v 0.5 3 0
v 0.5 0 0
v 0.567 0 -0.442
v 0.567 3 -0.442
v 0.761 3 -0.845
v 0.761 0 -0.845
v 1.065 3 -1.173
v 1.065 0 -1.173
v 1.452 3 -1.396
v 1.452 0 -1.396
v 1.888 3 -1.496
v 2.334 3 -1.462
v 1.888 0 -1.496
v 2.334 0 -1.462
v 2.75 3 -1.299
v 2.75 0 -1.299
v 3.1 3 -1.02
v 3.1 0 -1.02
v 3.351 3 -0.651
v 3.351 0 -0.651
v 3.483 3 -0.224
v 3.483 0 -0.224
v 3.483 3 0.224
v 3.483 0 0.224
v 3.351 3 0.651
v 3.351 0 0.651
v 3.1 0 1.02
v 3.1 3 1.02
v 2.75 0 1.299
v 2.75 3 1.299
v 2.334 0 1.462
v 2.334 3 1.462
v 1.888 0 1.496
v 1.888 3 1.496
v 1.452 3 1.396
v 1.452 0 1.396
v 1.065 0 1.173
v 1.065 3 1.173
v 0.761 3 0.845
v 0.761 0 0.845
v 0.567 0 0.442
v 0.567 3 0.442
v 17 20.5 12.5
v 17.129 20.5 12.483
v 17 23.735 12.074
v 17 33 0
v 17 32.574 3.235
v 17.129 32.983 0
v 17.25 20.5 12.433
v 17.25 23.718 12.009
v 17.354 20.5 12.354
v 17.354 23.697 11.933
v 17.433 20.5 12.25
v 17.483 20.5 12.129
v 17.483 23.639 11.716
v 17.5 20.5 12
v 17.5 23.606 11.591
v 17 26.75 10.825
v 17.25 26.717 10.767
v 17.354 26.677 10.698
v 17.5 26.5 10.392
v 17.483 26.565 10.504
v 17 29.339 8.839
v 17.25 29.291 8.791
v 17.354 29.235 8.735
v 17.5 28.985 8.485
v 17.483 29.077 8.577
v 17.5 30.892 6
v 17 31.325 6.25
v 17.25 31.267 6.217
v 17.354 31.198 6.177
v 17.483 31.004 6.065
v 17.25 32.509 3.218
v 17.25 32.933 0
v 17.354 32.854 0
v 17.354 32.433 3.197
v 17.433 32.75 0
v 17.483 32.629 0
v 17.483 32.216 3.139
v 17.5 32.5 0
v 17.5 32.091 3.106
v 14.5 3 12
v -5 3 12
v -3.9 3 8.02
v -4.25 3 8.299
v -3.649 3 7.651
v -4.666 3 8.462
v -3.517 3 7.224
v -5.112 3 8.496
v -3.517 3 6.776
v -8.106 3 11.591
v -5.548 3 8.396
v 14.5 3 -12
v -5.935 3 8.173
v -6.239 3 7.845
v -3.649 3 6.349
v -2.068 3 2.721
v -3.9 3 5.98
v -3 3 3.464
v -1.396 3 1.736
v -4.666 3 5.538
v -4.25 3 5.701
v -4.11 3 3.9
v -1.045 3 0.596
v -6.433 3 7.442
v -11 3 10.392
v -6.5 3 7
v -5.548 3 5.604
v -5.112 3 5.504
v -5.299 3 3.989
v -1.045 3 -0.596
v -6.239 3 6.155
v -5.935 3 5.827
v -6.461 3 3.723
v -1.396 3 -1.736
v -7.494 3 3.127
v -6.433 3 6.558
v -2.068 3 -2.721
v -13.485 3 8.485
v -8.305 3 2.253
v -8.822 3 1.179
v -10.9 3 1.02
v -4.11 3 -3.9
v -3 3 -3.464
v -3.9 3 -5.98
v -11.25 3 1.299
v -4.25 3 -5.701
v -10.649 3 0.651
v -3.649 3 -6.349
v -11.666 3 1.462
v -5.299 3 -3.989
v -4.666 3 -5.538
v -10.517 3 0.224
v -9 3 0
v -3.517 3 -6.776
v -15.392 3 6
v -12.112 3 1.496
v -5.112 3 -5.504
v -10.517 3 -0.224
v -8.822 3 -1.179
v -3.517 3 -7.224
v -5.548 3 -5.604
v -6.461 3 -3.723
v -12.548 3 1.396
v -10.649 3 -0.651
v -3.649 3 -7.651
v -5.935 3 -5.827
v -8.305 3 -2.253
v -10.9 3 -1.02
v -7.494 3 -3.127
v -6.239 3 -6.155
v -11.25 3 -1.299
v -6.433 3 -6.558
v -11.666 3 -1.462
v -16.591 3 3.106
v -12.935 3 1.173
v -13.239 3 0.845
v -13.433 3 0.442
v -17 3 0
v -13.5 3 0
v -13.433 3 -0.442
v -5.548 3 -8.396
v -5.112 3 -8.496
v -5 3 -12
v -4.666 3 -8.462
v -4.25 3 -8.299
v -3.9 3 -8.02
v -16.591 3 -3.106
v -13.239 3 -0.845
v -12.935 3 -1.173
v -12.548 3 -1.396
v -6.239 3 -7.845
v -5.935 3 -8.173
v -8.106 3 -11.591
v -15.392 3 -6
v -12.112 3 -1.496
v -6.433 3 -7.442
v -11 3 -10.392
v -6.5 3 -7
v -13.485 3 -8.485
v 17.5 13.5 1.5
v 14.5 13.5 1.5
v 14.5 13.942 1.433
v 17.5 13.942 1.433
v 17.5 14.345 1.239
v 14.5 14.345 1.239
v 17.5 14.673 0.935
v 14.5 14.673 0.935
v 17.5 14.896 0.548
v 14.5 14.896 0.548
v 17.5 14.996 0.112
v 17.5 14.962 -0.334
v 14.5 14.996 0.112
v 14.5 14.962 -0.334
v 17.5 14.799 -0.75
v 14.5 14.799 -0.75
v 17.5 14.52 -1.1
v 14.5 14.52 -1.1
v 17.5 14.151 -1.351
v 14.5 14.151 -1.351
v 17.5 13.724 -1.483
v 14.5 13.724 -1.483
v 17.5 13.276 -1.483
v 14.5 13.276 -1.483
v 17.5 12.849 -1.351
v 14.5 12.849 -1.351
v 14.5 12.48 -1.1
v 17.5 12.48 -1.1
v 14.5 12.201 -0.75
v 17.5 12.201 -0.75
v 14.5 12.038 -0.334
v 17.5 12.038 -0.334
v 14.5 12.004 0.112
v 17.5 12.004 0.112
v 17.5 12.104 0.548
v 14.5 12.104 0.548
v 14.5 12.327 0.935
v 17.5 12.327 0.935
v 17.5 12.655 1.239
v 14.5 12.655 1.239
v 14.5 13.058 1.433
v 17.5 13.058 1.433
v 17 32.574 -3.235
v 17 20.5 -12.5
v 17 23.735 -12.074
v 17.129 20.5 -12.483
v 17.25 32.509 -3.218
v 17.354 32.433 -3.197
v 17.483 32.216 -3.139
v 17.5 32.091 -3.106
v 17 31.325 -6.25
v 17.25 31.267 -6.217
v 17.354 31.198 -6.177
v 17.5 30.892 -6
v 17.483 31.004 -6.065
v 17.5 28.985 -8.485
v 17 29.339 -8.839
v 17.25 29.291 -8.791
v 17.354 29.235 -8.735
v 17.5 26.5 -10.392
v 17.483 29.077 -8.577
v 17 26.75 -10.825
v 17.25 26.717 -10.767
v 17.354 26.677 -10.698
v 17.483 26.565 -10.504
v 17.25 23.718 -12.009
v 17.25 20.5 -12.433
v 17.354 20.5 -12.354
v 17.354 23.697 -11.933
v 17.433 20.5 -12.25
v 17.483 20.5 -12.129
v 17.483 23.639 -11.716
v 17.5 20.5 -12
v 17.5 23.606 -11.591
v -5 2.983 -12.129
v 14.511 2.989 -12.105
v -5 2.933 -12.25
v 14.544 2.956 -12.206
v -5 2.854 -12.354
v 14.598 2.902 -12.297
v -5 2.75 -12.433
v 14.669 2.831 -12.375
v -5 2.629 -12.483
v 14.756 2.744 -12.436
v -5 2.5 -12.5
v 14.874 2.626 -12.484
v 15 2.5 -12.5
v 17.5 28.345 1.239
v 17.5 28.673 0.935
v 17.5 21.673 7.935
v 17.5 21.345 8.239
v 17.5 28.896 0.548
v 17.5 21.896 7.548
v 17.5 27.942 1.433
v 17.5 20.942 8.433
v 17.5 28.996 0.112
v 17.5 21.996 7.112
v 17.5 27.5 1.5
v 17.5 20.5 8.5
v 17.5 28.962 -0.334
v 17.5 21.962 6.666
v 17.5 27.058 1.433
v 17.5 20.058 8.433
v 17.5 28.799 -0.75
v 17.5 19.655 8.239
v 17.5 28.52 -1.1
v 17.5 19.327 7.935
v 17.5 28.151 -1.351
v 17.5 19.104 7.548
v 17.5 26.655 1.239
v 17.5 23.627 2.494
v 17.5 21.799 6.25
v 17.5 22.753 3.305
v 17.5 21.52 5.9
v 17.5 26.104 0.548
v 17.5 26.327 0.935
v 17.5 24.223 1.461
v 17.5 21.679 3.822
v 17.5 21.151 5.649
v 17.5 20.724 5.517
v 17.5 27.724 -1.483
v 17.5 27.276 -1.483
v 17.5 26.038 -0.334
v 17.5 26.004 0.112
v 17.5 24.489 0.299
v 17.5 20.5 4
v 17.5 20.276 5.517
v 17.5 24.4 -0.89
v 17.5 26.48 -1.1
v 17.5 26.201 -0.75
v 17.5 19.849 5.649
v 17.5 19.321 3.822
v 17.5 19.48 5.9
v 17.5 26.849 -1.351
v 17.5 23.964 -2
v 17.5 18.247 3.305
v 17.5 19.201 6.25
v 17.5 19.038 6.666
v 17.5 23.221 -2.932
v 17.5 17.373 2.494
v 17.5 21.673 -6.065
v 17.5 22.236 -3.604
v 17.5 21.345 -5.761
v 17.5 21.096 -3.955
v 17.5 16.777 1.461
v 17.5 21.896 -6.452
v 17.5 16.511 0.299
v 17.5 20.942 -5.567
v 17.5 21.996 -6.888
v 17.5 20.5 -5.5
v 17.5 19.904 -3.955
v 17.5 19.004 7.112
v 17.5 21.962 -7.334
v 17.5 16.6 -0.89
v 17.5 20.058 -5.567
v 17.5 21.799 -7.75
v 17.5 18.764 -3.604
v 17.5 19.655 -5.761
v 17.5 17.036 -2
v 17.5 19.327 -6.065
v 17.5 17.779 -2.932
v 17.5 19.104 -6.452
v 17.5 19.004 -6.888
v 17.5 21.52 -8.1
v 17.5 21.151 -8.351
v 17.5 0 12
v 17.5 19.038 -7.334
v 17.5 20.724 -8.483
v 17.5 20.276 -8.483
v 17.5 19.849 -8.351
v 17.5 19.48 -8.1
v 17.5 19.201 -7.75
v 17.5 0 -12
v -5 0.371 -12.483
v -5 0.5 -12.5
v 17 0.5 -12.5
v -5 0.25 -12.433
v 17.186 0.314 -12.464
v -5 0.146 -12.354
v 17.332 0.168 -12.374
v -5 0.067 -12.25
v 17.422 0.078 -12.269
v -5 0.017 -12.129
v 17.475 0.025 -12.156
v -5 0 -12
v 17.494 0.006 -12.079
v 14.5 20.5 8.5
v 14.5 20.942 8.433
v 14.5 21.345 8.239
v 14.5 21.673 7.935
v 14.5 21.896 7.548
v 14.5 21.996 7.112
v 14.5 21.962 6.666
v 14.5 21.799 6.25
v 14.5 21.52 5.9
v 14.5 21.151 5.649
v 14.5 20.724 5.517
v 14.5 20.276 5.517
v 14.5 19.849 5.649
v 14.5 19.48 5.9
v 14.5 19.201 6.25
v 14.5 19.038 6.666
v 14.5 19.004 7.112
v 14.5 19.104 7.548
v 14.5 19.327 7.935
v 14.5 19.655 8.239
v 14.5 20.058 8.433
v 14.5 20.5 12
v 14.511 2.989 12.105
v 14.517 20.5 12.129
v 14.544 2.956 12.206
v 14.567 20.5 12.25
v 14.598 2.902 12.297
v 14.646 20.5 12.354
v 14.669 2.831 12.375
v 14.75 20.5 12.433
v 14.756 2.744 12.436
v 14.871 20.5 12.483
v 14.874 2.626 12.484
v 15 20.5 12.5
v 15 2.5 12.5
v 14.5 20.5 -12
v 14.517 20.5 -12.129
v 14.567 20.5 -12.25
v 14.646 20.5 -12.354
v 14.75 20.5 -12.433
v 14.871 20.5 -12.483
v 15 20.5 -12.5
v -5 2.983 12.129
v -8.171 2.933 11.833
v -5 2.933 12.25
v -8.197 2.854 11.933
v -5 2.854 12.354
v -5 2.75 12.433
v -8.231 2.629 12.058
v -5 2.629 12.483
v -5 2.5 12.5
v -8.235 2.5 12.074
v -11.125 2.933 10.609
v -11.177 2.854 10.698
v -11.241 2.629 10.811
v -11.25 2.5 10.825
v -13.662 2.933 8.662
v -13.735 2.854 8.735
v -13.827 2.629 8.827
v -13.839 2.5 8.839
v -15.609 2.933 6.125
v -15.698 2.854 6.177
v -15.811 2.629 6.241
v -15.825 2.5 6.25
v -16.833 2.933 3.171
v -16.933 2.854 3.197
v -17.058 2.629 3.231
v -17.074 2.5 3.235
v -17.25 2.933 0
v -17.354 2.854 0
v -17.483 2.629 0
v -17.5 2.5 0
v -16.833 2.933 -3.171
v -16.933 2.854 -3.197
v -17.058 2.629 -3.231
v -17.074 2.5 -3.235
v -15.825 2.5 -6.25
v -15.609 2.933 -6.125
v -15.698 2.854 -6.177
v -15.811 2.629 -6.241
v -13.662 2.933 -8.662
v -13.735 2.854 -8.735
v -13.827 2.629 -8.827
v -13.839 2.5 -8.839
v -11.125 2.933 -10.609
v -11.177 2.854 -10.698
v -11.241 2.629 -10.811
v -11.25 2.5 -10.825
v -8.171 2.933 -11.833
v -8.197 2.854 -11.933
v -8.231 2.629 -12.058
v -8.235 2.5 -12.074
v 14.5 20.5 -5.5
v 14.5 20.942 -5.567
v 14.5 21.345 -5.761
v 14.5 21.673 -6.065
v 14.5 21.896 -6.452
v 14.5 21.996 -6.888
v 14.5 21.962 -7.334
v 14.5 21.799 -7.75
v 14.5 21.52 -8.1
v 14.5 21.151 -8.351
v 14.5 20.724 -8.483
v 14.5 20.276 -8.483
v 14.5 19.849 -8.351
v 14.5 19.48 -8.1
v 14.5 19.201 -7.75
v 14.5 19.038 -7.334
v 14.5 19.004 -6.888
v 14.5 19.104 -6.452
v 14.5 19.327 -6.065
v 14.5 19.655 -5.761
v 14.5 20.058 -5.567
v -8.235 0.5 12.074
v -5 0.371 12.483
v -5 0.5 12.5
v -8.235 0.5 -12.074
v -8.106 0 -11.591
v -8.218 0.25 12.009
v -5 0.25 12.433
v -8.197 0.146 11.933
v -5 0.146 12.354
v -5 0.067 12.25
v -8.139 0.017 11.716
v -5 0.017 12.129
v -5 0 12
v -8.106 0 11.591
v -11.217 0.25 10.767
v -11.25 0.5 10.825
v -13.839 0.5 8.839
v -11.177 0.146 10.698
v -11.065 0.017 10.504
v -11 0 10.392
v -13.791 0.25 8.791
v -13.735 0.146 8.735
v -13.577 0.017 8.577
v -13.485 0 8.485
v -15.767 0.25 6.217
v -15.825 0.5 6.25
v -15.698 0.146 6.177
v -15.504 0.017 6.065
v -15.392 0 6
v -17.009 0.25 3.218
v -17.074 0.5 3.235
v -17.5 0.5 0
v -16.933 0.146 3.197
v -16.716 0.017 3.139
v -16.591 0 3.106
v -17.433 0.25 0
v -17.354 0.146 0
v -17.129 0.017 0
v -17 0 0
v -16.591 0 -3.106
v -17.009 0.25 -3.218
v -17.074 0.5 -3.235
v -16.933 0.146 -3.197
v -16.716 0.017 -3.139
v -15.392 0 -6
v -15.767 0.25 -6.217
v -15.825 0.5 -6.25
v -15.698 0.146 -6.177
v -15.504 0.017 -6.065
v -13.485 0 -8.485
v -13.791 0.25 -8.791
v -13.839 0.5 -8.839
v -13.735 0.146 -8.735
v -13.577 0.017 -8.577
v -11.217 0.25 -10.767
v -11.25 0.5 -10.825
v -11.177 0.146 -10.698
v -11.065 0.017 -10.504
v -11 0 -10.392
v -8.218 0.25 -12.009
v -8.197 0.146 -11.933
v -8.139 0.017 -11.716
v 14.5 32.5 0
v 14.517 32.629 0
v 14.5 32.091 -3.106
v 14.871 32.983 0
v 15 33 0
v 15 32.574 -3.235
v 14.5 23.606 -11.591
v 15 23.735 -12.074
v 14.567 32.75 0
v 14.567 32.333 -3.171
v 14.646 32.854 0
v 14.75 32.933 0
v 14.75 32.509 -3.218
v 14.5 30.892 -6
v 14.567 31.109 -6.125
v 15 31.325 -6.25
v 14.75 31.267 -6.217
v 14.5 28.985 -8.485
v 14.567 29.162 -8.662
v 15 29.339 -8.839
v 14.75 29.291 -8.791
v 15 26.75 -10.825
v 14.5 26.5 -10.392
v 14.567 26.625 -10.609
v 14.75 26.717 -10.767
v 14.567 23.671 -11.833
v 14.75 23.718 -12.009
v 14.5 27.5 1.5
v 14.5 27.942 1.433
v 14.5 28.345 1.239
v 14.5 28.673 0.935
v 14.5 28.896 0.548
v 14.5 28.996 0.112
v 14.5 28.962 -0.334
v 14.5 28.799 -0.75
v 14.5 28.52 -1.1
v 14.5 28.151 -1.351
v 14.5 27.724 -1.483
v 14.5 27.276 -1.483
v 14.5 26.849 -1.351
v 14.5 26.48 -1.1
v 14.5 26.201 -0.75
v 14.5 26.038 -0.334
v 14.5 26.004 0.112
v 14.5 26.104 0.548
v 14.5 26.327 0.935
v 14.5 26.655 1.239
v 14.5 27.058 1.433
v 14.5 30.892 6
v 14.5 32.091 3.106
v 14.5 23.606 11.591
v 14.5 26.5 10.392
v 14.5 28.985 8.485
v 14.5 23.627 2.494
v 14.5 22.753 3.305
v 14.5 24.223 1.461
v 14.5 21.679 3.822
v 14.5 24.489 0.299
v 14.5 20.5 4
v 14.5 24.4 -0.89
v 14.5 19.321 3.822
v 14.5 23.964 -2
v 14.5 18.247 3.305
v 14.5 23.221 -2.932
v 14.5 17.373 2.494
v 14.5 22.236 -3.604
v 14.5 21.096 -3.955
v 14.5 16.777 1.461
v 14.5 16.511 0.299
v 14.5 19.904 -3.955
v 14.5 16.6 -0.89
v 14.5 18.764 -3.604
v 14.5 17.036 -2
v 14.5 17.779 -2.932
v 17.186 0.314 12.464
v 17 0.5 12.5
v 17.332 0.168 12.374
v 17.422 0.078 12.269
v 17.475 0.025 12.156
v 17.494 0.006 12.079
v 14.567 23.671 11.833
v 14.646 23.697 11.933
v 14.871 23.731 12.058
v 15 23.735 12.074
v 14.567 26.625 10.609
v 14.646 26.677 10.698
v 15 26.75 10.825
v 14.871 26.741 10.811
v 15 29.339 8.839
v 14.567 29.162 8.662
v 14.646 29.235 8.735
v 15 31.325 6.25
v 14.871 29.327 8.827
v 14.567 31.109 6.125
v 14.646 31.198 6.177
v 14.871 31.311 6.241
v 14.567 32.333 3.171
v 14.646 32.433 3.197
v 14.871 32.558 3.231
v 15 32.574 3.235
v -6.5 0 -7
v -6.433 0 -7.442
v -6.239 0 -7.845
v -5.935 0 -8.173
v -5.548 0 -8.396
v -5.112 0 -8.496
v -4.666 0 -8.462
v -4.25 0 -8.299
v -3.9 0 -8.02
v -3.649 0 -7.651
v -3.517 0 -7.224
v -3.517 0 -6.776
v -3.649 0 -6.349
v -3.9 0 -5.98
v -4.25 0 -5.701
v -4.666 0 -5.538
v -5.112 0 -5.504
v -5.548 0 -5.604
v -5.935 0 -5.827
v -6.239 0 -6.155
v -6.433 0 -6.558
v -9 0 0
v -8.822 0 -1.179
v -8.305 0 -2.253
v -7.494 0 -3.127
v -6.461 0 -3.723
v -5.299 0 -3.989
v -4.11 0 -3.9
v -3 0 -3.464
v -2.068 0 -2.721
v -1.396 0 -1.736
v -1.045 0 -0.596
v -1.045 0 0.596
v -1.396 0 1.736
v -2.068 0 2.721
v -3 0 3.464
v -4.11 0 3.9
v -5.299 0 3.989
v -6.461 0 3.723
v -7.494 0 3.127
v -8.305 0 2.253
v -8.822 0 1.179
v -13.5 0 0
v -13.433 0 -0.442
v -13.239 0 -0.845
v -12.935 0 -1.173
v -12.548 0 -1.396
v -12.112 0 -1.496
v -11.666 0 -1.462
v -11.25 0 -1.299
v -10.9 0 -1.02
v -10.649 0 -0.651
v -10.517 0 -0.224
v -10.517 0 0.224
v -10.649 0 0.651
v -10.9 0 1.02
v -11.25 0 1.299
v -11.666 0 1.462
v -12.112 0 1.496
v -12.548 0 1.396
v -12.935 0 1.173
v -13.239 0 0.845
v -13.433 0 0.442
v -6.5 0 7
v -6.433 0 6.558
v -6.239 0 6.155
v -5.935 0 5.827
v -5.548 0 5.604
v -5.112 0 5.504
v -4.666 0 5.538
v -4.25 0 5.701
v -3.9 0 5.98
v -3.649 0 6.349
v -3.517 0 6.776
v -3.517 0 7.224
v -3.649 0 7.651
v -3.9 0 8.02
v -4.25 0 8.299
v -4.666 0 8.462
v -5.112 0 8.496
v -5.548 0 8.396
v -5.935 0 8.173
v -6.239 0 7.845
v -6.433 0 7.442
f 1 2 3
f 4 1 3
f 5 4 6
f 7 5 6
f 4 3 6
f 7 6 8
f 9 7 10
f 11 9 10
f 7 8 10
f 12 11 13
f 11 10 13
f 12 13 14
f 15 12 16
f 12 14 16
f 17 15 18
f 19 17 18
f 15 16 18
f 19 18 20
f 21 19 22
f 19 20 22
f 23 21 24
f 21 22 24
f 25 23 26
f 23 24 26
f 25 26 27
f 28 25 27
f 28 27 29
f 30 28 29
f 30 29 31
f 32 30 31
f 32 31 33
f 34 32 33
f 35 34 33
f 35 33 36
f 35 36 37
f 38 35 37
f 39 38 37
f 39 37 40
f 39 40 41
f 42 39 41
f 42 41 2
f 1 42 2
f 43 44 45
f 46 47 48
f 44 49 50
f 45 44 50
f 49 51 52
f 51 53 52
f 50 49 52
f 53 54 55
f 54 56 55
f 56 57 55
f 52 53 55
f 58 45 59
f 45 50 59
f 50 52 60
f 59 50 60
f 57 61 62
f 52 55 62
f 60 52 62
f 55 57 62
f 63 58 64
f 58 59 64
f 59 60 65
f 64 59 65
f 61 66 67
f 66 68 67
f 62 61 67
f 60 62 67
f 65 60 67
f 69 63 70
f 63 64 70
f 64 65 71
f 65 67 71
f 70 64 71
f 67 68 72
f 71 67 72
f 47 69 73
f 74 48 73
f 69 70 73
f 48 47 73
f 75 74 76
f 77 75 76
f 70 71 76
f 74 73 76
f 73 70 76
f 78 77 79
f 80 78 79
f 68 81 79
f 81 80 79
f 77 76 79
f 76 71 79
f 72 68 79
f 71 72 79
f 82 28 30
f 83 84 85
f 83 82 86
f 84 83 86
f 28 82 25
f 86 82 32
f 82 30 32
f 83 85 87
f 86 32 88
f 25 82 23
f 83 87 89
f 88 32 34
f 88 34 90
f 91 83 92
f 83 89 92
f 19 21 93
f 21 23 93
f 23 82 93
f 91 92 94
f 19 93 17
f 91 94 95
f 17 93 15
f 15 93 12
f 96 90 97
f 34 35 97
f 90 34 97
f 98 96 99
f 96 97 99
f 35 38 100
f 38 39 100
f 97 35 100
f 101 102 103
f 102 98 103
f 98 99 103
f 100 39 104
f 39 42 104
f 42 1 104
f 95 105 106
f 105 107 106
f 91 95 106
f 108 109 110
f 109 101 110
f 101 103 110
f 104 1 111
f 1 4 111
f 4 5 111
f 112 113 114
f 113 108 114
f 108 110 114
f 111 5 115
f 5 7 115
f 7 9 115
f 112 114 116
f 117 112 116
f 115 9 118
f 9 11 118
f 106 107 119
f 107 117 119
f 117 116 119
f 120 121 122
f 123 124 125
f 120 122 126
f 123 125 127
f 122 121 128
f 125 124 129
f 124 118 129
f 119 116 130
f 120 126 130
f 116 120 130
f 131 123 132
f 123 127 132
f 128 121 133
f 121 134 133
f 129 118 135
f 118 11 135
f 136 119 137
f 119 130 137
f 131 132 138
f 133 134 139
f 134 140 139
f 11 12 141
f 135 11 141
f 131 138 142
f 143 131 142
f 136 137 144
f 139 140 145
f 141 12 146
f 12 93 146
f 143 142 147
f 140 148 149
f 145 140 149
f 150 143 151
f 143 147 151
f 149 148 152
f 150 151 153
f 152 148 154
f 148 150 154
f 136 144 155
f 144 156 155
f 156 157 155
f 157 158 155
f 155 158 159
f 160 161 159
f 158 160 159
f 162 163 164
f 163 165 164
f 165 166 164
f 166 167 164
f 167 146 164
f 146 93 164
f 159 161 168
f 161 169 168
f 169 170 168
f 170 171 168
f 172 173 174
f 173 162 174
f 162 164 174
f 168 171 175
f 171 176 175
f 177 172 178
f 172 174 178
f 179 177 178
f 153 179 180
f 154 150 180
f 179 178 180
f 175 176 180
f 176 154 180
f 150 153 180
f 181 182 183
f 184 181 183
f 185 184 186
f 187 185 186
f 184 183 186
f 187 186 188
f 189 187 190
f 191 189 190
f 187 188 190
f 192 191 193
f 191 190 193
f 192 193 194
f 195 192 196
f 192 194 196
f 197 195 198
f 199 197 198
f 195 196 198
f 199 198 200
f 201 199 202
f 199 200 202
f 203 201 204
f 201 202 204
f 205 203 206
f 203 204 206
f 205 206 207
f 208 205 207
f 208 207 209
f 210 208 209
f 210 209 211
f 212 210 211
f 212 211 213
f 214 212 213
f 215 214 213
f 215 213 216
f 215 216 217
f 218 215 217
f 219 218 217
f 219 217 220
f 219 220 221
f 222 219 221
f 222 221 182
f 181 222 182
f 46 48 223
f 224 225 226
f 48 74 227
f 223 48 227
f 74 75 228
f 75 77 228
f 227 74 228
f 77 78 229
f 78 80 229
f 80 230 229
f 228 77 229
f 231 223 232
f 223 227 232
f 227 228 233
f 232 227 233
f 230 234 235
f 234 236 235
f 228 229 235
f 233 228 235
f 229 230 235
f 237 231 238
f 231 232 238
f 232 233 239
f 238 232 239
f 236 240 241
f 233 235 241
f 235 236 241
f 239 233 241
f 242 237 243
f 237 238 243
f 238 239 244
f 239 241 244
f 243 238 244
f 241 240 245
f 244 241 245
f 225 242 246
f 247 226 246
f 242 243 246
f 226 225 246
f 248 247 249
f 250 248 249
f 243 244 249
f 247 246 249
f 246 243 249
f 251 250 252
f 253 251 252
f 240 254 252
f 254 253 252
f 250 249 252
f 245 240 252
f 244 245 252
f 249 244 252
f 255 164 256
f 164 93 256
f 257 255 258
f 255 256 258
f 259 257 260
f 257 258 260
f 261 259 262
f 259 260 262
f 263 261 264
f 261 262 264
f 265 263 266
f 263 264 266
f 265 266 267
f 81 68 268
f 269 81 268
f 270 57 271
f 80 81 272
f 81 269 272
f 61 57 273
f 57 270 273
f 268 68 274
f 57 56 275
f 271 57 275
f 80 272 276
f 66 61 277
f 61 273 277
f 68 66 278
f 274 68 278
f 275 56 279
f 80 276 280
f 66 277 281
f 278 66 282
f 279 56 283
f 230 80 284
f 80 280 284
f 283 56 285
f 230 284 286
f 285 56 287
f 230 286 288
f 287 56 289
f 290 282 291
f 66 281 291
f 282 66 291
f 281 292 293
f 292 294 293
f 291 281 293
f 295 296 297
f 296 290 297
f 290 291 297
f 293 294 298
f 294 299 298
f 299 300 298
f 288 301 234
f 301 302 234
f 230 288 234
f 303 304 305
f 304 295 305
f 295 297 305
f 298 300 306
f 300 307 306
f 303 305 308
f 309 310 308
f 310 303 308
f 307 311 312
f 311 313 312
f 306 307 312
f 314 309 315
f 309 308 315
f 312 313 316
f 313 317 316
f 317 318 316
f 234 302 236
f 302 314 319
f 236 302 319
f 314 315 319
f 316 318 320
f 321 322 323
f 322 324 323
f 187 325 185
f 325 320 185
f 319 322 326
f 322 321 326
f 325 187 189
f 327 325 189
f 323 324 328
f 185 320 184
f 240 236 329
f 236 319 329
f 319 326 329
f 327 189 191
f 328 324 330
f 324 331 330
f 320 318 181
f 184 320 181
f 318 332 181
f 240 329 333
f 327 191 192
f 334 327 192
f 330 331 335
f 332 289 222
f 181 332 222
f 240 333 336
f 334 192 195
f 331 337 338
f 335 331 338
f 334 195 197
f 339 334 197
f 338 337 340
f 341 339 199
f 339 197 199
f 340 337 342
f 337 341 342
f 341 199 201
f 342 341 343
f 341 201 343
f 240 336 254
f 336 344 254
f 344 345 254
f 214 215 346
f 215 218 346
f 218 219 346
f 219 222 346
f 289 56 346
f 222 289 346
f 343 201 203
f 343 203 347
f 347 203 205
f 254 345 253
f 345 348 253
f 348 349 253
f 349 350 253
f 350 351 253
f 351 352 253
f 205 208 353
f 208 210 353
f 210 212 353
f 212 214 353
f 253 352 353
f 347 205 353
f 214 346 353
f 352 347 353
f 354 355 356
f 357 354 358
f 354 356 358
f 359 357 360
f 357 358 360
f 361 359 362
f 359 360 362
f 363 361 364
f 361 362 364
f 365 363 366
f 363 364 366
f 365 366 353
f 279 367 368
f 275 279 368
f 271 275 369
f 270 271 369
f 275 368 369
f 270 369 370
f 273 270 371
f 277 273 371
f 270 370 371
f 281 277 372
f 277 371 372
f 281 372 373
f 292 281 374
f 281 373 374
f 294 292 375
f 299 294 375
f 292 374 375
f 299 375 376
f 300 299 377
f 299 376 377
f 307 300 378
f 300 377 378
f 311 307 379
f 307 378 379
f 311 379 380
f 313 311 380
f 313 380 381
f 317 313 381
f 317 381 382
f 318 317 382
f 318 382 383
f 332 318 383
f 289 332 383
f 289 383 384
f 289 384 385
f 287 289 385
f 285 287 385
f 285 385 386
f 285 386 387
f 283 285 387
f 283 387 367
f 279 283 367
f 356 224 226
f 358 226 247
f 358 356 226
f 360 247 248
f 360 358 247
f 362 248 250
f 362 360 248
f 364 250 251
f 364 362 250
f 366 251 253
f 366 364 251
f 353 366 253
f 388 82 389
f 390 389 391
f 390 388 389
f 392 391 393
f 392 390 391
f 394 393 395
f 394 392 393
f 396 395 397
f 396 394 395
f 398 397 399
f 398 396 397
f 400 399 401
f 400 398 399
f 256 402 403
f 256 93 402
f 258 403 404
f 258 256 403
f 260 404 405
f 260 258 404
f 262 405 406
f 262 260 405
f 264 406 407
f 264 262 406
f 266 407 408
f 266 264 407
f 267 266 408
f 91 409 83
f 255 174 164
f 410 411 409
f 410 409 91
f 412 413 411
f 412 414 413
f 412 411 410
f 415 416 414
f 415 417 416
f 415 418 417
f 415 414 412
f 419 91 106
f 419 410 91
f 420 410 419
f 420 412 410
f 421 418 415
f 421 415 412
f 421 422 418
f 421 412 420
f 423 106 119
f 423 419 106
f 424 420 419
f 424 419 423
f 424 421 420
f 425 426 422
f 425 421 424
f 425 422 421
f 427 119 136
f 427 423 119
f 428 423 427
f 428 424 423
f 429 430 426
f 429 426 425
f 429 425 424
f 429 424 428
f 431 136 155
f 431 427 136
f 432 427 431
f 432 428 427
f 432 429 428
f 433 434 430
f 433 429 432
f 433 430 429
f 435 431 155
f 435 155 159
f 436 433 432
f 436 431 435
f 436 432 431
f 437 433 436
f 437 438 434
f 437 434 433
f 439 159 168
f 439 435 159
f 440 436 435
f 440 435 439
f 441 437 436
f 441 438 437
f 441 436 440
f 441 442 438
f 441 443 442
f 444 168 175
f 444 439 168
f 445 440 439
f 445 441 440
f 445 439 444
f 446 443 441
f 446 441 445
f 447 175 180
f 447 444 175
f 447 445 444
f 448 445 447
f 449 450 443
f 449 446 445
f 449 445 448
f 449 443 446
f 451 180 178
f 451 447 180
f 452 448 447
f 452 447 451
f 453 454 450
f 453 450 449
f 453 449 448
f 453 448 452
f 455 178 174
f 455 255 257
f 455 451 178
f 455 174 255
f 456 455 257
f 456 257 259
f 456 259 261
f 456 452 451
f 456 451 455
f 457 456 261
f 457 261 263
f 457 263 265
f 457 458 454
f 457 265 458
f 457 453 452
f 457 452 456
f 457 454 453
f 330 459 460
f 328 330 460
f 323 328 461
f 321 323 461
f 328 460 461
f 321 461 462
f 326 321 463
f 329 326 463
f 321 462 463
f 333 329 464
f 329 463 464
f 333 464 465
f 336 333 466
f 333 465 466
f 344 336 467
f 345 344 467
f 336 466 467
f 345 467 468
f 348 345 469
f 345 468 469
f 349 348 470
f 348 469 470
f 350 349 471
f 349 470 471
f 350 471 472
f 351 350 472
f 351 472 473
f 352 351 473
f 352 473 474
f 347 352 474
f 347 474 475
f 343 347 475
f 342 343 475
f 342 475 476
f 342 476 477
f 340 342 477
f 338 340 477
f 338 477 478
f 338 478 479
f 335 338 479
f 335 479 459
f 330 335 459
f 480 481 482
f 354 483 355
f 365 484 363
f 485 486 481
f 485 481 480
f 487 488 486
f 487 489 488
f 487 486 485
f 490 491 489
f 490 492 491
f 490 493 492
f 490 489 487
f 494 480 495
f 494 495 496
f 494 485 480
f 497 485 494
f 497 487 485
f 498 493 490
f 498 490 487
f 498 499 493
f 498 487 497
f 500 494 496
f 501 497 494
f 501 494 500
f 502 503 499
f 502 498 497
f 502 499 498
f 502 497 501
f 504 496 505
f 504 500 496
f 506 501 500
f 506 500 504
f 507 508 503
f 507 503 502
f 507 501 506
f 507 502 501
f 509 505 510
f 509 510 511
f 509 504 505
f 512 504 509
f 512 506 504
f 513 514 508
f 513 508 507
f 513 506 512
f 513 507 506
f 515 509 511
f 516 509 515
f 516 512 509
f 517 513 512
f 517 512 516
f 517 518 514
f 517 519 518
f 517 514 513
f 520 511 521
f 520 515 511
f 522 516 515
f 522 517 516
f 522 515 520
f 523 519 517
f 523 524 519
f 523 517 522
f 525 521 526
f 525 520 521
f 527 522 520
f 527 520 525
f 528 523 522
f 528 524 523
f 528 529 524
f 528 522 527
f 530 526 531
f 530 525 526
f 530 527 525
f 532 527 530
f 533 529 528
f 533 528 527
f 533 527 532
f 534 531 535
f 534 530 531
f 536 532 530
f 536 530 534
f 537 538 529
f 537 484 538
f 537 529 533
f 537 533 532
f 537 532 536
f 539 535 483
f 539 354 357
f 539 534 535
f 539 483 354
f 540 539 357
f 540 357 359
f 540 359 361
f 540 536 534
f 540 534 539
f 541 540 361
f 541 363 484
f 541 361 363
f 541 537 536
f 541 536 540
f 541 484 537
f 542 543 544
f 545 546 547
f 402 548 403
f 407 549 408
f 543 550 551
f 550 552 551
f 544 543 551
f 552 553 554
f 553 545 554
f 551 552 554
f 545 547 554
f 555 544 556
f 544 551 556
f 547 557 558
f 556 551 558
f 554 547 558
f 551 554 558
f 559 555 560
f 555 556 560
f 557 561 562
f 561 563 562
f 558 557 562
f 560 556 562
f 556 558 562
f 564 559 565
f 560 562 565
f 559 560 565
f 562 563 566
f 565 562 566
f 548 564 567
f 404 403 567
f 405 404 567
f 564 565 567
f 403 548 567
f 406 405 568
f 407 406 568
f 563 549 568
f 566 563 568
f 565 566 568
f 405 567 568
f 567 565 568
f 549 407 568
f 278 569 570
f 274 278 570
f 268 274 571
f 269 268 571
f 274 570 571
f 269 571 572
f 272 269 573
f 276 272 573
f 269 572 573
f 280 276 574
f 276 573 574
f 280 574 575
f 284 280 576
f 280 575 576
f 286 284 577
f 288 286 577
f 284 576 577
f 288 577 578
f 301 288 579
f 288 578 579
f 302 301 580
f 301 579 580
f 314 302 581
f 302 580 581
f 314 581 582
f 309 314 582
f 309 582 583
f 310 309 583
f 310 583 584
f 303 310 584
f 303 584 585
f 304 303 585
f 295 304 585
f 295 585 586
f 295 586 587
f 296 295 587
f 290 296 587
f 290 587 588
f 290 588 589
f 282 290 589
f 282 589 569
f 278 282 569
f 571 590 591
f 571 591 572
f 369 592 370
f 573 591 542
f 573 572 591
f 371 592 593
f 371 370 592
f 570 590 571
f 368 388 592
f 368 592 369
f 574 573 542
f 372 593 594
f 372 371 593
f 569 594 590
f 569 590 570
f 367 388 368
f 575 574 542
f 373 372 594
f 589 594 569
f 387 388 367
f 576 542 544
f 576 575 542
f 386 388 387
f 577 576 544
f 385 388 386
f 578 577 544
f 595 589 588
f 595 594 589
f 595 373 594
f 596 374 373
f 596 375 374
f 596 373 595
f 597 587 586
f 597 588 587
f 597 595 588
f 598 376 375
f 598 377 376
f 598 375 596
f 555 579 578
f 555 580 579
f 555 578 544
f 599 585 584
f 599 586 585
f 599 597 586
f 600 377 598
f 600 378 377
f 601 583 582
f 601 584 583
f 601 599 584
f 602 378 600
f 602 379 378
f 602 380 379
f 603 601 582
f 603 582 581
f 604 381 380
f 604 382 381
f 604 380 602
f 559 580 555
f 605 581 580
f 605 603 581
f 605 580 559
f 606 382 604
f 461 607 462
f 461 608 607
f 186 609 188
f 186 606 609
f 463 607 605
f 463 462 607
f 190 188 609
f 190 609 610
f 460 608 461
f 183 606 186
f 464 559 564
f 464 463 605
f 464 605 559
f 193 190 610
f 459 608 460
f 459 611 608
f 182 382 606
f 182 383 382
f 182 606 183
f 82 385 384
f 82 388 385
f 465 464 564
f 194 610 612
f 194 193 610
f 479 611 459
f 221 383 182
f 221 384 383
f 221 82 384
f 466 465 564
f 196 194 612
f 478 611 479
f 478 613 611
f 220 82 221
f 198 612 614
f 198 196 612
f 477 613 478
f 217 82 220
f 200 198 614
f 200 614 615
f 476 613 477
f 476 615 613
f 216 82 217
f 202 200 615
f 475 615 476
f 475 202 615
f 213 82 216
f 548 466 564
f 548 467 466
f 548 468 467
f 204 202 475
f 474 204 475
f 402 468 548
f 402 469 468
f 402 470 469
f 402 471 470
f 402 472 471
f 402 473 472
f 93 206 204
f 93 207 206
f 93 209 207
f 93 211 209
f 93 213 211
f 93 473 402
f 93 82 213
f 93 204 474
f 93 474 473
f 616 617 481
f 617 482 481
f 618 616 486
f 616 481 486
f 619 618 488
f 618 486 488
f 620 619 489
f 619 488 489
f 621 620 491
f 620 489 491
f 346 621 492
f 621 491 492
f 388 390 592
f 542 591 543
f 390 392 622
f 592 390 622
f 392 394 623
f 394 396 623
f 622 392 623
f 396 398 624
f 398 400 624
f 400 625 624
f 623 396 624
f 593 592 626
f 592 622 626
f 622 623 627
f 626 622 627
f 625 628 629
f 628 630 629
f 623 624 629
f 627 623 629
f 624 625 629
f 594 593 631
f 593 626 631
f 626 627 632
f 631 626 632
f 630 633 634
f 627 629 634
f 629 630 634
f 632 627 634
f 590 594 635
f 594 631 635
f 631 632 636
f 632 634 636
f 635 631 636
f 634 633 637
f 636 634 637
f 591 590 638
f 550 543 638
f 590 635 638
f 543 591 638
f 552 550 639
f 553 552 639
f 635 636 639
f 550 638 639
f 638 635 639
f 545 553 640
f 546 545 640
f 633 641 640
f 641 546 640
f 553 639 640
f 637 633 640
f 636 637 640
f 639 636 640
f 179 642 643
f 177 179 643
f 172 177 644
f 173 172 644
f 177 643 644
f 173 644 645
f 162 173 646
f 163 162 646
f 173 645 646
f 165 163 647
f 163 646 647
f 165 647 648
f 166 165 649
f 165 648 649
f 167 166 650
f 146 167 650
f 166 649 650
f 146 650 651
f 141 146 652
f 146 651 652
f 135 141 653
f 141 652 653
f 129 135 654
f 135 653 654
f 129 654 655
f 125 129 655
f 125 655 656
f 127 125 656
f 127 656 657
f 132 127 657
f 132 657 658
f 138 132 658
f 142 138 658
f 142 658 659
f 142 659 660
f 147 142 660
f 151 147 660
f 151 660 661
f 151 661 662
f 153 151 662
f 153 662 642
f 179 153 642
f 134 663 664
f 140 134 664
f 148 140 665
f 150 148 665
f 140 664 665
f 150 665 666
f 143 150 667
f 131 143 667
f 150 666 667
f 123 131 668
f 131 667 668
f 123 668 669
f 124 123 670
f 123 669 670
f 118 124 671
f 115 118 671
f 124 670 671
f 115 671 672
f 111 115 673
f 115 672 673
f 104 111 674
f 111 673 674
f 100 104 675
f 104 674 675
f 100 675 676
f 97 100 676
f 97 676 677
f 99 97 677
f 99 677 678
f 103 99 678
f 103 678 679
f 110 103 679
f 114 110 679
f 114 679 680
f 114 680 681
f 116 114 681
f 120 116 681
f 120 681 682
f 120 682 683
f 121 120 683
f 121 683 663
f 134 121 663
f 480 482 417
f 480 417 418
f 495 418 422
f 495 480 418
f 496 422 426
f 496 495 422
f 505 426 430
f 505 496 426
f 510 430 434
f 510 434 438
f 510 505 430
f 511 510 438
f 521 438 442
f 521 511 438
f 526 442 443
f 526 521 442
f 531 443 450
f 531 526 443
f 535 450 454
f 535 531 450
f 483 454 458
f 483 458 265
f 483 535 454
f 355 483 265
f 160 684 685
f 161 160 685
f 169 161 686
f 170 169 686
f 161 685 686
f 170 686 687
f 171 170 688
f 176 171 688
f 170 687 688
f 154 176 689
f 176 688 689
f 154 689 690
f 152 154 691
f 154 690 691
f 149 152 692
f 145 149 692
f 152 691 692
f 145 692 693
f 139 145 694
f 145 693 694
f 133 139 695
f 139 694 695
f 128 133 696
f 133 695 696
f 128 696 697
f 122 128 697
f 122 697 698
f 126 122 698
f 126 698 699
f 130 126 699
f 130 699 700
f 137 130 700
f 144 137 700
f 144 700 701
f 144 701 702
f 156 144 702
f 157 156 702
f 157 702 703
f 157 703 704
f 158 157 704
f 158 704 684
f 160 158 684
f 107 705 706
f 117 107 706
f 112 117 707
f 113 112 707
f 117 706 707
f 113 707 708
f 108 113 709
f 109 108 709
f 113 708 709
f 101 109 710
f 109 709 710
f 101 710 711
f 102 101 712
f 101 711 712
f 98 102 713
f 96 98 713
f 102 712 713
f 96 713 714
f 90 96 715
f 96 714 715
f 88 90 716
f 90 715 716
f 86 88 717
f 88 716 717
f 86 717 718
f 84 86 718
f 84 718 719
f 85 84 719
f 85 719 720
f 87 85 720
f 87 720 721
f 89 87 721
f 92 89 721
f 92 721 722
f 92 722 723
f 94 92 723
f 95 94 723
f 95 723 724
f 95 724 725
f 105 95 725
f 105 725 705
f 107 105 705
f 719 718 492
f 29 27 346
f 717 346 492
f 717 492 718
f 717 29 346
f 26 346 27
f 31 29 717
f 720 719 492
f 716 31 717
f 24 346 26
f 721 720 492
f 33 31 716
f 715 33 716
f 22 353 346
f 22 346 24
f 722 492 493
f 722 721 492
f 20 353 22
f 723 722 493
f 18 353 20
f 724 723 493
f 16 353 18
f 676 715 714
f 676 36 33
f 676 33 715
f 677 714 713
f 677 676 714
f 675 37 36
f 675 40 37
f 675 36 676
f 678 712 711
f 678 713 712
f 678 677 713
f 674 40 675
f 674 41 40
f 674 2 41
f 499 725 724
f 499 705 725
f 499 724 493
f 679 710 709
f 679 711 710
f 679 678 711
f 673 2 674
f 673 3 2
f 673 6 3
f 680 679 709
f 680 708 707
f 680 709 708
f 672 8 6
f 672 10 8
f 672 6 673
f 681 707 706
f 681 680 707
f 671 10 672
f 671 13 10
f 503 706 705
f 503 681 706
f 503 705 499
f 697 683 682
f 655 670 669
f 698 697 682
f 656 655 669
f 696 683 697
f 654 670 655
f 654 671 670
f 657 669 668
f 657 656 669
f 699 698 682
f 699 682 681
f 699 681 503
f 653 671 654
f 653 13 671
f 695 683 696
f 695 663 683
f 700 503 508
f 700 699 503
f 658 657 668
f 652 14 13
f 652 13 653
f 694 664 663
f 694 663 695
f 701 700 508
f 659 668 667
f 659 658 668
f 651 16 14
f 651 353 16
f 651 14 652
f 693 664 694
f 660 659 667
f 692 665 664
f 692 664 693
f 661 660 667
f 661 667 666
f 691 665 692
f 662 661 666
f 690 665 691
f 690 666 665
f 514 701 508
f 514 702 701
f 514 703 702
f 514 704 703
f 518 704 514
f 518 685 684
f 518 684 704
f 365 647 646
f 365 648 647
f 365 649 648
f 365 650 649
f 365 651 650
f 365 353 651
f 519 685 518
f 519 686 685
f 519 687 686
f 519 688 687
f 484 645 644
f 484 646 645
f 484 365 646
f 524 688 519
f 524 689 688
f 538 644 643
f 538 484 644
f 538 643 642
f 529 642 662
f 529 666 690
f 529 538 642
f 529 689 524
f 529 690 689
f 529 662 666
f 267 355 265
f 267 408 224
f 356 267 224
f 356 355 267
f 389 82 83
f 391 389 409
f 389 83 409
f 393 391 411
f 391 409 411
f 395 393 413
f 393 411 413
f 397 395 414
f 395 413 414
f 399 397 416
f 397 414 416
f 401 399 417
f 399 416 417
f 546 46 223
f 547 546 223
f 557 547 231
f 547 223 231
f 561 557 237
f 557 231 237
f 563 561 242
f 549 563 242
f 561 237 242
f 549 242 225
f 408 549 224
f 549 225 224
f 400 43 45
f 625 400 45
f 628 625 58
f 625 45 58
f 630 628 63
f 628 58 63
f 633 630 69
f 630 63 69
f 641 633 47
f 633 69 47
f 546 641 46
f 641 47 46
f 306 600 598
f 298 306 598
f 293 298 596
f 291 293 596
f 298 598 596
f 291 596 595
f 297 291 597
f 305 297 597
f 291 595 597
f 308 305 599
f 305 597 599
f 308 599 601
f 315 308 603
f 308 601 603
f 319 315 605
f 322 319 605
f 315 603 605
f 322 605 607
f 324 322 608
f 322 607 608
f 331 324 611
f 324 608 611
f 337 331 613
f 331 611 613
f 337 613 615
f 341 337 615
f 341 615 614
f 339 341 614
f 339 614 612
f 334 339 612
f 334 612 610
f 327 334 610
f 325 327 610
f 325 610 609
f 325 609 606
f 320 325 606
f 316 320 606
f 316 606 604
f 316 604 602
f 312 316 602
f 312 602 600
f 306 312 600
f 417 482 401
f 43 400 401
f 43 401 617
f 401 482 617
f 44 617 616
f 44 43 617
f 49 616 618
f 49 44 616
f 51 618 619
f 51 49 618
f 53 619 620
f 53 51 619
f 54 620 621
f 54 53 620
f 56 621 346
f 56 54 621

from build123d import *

# Parameters (mm, degrees)
BOSS_EXTRUDE1_DEPTH   = 3
SKETCH2_W             = 3
SKETCH2_H             = 25
BOSS_EXTRUDE2_DEPTH   = 30
CUT_EXTRUDE2_DEPTH    = 3
F_8_0MM_DOWEL_HOLE1_D = 8
F_8_0MM_DOWEL_HOLE2_D = 8
F_3_0MM_DOWEL_HOLE1_D = 3
F_3_0MM_DOWEL_HOLE2_D = 3
FILLET1_R             = 0.5


with BuildPart() as part:
    # Sketch1 → Boss-Extrude1 (new body)
    with BuildSketch(Plane(origin=(0, 0, 0), x_dir=(1, 0, 0), z_dir=(0, 1, 0))):
        with BuildLine():
            Line((-5, 12.5), (17.5, 12.5))
            Line((17.5, 12.5), (17.5, -12.5))
            Line((17.5, -12.5), (-5, -12.5))
            ThreePointArc((-5, -12.5), (-17.5, 0), (-5, 12.5))
        make_face()
    extrude(amount=BOSS_EXTRUDE1_DEPTH)

    # Sketch2 → Boss-Extrude2 (add)
    with BuildSketch(Plane(origin=(0, 3, 0), x_dir=(1, 0, 0), z_dir=(0, 1, 0))):
        with Locations((16, 0)):
            Rectangle(SKETCH2_W, SKETCH2_H)
    extrude(amount=BOSS_EXTRUDE2_DEPTH)

    # Sketch3 → Cut-Extrude2 (cut)
    with BuildSketch(Plane(origin=(17.5, 0, 0), x_dir=(0, 0, -1), z_dir=(1, 0, 0))):
        with BuildLine():
            Line((0, 33), (-12.5, 33))
            Line((-12.5, 33), (-12.5, 20.5))
            ThreePointArc((-12.5, 20.5), (-8.838834765, 29.338834765), (0, 33))
        make_face()
        with BuildLine():
            Line((12.5, 33), (0, 33))
            ThreePointArc((0, 33), (8.838834765, 29.338834765), (12.5, 20.5))
            Line((12.5, 20.5), (12.5, 33))
        make_face()
    extrude(amount=-CUT_EXTRUDE2_DEPTH, mode=Mode.SUBTRACT)

    # Ø8.0mm Dowel Hole1 (through all)
    with Locations(Plane(origin=(17.5, 0, 0), x_dir=(0, 0, -1), z_dir=(1, 0, 0))):
        with Locations((0, 20.5)):
            Hole(F_8_0MM_DOWEL_HOLE1_D / 2)

    # Ø8.0mm Dowel Hole2 (through all)
    with Locations(Plane(origin=(0, 3, 0), x_dir=(1, 0, 0), z_dir=(0, 1, 0))):
        with Locations((-5, 0)):
            Hole(F_8_0MM_DOWEL_HOLE2_D / 2)

    # Ø3.0mm Dowel Hole1 (through all)
    with Locations(Plane(origin=(17.5, 0, 0), x_dir=(0, 0, -1), z_dir=(1, 0, 0))):
        with Locations((0, 27.5), (7, 20.5), (0, 13.5), (-7, 20.5), (0, 20.5)):
            Hole(F_3_0MM_DOWEL_HOLE1_D / 2)

    # Ø3.0mm Dowel Hole2 (through all)
    with Locations(Plane(origin=(0, 3, 0), x_dir=(1, 0, 0), z_dir=(0, 1, 0))):
        with Locations((-12, 0), (-5, 7), (2, 0), (-5, -7), (-5, 0)):
            Hole(F_3_0MM_DOWEL_HOLE2_D / 2)

    # Fillet1
    fillet1_edges = [part.edges().sort_by_distance(p)[0] for p in [
        (4.75, 3, -12.5),
        (14.5, 11.75, 12.5),
        (17.5, 10.25, 12.5),
        (17.5, 33, 0),
        (14.5, 33, 0),
        (14.5, 11.75, -12.5),
        (17.5, 10.25, -12.5),
        (-17.5, 3, 0),
        (6.25, 0, -12.5),
        (6.25, 0, 12.5),
        (-17.5, 0, 0),
        (4.75, 3, 12.5),
    ]]
    fillet(fillet1_edges, radius=FILLET1_R)


solid = part.part
